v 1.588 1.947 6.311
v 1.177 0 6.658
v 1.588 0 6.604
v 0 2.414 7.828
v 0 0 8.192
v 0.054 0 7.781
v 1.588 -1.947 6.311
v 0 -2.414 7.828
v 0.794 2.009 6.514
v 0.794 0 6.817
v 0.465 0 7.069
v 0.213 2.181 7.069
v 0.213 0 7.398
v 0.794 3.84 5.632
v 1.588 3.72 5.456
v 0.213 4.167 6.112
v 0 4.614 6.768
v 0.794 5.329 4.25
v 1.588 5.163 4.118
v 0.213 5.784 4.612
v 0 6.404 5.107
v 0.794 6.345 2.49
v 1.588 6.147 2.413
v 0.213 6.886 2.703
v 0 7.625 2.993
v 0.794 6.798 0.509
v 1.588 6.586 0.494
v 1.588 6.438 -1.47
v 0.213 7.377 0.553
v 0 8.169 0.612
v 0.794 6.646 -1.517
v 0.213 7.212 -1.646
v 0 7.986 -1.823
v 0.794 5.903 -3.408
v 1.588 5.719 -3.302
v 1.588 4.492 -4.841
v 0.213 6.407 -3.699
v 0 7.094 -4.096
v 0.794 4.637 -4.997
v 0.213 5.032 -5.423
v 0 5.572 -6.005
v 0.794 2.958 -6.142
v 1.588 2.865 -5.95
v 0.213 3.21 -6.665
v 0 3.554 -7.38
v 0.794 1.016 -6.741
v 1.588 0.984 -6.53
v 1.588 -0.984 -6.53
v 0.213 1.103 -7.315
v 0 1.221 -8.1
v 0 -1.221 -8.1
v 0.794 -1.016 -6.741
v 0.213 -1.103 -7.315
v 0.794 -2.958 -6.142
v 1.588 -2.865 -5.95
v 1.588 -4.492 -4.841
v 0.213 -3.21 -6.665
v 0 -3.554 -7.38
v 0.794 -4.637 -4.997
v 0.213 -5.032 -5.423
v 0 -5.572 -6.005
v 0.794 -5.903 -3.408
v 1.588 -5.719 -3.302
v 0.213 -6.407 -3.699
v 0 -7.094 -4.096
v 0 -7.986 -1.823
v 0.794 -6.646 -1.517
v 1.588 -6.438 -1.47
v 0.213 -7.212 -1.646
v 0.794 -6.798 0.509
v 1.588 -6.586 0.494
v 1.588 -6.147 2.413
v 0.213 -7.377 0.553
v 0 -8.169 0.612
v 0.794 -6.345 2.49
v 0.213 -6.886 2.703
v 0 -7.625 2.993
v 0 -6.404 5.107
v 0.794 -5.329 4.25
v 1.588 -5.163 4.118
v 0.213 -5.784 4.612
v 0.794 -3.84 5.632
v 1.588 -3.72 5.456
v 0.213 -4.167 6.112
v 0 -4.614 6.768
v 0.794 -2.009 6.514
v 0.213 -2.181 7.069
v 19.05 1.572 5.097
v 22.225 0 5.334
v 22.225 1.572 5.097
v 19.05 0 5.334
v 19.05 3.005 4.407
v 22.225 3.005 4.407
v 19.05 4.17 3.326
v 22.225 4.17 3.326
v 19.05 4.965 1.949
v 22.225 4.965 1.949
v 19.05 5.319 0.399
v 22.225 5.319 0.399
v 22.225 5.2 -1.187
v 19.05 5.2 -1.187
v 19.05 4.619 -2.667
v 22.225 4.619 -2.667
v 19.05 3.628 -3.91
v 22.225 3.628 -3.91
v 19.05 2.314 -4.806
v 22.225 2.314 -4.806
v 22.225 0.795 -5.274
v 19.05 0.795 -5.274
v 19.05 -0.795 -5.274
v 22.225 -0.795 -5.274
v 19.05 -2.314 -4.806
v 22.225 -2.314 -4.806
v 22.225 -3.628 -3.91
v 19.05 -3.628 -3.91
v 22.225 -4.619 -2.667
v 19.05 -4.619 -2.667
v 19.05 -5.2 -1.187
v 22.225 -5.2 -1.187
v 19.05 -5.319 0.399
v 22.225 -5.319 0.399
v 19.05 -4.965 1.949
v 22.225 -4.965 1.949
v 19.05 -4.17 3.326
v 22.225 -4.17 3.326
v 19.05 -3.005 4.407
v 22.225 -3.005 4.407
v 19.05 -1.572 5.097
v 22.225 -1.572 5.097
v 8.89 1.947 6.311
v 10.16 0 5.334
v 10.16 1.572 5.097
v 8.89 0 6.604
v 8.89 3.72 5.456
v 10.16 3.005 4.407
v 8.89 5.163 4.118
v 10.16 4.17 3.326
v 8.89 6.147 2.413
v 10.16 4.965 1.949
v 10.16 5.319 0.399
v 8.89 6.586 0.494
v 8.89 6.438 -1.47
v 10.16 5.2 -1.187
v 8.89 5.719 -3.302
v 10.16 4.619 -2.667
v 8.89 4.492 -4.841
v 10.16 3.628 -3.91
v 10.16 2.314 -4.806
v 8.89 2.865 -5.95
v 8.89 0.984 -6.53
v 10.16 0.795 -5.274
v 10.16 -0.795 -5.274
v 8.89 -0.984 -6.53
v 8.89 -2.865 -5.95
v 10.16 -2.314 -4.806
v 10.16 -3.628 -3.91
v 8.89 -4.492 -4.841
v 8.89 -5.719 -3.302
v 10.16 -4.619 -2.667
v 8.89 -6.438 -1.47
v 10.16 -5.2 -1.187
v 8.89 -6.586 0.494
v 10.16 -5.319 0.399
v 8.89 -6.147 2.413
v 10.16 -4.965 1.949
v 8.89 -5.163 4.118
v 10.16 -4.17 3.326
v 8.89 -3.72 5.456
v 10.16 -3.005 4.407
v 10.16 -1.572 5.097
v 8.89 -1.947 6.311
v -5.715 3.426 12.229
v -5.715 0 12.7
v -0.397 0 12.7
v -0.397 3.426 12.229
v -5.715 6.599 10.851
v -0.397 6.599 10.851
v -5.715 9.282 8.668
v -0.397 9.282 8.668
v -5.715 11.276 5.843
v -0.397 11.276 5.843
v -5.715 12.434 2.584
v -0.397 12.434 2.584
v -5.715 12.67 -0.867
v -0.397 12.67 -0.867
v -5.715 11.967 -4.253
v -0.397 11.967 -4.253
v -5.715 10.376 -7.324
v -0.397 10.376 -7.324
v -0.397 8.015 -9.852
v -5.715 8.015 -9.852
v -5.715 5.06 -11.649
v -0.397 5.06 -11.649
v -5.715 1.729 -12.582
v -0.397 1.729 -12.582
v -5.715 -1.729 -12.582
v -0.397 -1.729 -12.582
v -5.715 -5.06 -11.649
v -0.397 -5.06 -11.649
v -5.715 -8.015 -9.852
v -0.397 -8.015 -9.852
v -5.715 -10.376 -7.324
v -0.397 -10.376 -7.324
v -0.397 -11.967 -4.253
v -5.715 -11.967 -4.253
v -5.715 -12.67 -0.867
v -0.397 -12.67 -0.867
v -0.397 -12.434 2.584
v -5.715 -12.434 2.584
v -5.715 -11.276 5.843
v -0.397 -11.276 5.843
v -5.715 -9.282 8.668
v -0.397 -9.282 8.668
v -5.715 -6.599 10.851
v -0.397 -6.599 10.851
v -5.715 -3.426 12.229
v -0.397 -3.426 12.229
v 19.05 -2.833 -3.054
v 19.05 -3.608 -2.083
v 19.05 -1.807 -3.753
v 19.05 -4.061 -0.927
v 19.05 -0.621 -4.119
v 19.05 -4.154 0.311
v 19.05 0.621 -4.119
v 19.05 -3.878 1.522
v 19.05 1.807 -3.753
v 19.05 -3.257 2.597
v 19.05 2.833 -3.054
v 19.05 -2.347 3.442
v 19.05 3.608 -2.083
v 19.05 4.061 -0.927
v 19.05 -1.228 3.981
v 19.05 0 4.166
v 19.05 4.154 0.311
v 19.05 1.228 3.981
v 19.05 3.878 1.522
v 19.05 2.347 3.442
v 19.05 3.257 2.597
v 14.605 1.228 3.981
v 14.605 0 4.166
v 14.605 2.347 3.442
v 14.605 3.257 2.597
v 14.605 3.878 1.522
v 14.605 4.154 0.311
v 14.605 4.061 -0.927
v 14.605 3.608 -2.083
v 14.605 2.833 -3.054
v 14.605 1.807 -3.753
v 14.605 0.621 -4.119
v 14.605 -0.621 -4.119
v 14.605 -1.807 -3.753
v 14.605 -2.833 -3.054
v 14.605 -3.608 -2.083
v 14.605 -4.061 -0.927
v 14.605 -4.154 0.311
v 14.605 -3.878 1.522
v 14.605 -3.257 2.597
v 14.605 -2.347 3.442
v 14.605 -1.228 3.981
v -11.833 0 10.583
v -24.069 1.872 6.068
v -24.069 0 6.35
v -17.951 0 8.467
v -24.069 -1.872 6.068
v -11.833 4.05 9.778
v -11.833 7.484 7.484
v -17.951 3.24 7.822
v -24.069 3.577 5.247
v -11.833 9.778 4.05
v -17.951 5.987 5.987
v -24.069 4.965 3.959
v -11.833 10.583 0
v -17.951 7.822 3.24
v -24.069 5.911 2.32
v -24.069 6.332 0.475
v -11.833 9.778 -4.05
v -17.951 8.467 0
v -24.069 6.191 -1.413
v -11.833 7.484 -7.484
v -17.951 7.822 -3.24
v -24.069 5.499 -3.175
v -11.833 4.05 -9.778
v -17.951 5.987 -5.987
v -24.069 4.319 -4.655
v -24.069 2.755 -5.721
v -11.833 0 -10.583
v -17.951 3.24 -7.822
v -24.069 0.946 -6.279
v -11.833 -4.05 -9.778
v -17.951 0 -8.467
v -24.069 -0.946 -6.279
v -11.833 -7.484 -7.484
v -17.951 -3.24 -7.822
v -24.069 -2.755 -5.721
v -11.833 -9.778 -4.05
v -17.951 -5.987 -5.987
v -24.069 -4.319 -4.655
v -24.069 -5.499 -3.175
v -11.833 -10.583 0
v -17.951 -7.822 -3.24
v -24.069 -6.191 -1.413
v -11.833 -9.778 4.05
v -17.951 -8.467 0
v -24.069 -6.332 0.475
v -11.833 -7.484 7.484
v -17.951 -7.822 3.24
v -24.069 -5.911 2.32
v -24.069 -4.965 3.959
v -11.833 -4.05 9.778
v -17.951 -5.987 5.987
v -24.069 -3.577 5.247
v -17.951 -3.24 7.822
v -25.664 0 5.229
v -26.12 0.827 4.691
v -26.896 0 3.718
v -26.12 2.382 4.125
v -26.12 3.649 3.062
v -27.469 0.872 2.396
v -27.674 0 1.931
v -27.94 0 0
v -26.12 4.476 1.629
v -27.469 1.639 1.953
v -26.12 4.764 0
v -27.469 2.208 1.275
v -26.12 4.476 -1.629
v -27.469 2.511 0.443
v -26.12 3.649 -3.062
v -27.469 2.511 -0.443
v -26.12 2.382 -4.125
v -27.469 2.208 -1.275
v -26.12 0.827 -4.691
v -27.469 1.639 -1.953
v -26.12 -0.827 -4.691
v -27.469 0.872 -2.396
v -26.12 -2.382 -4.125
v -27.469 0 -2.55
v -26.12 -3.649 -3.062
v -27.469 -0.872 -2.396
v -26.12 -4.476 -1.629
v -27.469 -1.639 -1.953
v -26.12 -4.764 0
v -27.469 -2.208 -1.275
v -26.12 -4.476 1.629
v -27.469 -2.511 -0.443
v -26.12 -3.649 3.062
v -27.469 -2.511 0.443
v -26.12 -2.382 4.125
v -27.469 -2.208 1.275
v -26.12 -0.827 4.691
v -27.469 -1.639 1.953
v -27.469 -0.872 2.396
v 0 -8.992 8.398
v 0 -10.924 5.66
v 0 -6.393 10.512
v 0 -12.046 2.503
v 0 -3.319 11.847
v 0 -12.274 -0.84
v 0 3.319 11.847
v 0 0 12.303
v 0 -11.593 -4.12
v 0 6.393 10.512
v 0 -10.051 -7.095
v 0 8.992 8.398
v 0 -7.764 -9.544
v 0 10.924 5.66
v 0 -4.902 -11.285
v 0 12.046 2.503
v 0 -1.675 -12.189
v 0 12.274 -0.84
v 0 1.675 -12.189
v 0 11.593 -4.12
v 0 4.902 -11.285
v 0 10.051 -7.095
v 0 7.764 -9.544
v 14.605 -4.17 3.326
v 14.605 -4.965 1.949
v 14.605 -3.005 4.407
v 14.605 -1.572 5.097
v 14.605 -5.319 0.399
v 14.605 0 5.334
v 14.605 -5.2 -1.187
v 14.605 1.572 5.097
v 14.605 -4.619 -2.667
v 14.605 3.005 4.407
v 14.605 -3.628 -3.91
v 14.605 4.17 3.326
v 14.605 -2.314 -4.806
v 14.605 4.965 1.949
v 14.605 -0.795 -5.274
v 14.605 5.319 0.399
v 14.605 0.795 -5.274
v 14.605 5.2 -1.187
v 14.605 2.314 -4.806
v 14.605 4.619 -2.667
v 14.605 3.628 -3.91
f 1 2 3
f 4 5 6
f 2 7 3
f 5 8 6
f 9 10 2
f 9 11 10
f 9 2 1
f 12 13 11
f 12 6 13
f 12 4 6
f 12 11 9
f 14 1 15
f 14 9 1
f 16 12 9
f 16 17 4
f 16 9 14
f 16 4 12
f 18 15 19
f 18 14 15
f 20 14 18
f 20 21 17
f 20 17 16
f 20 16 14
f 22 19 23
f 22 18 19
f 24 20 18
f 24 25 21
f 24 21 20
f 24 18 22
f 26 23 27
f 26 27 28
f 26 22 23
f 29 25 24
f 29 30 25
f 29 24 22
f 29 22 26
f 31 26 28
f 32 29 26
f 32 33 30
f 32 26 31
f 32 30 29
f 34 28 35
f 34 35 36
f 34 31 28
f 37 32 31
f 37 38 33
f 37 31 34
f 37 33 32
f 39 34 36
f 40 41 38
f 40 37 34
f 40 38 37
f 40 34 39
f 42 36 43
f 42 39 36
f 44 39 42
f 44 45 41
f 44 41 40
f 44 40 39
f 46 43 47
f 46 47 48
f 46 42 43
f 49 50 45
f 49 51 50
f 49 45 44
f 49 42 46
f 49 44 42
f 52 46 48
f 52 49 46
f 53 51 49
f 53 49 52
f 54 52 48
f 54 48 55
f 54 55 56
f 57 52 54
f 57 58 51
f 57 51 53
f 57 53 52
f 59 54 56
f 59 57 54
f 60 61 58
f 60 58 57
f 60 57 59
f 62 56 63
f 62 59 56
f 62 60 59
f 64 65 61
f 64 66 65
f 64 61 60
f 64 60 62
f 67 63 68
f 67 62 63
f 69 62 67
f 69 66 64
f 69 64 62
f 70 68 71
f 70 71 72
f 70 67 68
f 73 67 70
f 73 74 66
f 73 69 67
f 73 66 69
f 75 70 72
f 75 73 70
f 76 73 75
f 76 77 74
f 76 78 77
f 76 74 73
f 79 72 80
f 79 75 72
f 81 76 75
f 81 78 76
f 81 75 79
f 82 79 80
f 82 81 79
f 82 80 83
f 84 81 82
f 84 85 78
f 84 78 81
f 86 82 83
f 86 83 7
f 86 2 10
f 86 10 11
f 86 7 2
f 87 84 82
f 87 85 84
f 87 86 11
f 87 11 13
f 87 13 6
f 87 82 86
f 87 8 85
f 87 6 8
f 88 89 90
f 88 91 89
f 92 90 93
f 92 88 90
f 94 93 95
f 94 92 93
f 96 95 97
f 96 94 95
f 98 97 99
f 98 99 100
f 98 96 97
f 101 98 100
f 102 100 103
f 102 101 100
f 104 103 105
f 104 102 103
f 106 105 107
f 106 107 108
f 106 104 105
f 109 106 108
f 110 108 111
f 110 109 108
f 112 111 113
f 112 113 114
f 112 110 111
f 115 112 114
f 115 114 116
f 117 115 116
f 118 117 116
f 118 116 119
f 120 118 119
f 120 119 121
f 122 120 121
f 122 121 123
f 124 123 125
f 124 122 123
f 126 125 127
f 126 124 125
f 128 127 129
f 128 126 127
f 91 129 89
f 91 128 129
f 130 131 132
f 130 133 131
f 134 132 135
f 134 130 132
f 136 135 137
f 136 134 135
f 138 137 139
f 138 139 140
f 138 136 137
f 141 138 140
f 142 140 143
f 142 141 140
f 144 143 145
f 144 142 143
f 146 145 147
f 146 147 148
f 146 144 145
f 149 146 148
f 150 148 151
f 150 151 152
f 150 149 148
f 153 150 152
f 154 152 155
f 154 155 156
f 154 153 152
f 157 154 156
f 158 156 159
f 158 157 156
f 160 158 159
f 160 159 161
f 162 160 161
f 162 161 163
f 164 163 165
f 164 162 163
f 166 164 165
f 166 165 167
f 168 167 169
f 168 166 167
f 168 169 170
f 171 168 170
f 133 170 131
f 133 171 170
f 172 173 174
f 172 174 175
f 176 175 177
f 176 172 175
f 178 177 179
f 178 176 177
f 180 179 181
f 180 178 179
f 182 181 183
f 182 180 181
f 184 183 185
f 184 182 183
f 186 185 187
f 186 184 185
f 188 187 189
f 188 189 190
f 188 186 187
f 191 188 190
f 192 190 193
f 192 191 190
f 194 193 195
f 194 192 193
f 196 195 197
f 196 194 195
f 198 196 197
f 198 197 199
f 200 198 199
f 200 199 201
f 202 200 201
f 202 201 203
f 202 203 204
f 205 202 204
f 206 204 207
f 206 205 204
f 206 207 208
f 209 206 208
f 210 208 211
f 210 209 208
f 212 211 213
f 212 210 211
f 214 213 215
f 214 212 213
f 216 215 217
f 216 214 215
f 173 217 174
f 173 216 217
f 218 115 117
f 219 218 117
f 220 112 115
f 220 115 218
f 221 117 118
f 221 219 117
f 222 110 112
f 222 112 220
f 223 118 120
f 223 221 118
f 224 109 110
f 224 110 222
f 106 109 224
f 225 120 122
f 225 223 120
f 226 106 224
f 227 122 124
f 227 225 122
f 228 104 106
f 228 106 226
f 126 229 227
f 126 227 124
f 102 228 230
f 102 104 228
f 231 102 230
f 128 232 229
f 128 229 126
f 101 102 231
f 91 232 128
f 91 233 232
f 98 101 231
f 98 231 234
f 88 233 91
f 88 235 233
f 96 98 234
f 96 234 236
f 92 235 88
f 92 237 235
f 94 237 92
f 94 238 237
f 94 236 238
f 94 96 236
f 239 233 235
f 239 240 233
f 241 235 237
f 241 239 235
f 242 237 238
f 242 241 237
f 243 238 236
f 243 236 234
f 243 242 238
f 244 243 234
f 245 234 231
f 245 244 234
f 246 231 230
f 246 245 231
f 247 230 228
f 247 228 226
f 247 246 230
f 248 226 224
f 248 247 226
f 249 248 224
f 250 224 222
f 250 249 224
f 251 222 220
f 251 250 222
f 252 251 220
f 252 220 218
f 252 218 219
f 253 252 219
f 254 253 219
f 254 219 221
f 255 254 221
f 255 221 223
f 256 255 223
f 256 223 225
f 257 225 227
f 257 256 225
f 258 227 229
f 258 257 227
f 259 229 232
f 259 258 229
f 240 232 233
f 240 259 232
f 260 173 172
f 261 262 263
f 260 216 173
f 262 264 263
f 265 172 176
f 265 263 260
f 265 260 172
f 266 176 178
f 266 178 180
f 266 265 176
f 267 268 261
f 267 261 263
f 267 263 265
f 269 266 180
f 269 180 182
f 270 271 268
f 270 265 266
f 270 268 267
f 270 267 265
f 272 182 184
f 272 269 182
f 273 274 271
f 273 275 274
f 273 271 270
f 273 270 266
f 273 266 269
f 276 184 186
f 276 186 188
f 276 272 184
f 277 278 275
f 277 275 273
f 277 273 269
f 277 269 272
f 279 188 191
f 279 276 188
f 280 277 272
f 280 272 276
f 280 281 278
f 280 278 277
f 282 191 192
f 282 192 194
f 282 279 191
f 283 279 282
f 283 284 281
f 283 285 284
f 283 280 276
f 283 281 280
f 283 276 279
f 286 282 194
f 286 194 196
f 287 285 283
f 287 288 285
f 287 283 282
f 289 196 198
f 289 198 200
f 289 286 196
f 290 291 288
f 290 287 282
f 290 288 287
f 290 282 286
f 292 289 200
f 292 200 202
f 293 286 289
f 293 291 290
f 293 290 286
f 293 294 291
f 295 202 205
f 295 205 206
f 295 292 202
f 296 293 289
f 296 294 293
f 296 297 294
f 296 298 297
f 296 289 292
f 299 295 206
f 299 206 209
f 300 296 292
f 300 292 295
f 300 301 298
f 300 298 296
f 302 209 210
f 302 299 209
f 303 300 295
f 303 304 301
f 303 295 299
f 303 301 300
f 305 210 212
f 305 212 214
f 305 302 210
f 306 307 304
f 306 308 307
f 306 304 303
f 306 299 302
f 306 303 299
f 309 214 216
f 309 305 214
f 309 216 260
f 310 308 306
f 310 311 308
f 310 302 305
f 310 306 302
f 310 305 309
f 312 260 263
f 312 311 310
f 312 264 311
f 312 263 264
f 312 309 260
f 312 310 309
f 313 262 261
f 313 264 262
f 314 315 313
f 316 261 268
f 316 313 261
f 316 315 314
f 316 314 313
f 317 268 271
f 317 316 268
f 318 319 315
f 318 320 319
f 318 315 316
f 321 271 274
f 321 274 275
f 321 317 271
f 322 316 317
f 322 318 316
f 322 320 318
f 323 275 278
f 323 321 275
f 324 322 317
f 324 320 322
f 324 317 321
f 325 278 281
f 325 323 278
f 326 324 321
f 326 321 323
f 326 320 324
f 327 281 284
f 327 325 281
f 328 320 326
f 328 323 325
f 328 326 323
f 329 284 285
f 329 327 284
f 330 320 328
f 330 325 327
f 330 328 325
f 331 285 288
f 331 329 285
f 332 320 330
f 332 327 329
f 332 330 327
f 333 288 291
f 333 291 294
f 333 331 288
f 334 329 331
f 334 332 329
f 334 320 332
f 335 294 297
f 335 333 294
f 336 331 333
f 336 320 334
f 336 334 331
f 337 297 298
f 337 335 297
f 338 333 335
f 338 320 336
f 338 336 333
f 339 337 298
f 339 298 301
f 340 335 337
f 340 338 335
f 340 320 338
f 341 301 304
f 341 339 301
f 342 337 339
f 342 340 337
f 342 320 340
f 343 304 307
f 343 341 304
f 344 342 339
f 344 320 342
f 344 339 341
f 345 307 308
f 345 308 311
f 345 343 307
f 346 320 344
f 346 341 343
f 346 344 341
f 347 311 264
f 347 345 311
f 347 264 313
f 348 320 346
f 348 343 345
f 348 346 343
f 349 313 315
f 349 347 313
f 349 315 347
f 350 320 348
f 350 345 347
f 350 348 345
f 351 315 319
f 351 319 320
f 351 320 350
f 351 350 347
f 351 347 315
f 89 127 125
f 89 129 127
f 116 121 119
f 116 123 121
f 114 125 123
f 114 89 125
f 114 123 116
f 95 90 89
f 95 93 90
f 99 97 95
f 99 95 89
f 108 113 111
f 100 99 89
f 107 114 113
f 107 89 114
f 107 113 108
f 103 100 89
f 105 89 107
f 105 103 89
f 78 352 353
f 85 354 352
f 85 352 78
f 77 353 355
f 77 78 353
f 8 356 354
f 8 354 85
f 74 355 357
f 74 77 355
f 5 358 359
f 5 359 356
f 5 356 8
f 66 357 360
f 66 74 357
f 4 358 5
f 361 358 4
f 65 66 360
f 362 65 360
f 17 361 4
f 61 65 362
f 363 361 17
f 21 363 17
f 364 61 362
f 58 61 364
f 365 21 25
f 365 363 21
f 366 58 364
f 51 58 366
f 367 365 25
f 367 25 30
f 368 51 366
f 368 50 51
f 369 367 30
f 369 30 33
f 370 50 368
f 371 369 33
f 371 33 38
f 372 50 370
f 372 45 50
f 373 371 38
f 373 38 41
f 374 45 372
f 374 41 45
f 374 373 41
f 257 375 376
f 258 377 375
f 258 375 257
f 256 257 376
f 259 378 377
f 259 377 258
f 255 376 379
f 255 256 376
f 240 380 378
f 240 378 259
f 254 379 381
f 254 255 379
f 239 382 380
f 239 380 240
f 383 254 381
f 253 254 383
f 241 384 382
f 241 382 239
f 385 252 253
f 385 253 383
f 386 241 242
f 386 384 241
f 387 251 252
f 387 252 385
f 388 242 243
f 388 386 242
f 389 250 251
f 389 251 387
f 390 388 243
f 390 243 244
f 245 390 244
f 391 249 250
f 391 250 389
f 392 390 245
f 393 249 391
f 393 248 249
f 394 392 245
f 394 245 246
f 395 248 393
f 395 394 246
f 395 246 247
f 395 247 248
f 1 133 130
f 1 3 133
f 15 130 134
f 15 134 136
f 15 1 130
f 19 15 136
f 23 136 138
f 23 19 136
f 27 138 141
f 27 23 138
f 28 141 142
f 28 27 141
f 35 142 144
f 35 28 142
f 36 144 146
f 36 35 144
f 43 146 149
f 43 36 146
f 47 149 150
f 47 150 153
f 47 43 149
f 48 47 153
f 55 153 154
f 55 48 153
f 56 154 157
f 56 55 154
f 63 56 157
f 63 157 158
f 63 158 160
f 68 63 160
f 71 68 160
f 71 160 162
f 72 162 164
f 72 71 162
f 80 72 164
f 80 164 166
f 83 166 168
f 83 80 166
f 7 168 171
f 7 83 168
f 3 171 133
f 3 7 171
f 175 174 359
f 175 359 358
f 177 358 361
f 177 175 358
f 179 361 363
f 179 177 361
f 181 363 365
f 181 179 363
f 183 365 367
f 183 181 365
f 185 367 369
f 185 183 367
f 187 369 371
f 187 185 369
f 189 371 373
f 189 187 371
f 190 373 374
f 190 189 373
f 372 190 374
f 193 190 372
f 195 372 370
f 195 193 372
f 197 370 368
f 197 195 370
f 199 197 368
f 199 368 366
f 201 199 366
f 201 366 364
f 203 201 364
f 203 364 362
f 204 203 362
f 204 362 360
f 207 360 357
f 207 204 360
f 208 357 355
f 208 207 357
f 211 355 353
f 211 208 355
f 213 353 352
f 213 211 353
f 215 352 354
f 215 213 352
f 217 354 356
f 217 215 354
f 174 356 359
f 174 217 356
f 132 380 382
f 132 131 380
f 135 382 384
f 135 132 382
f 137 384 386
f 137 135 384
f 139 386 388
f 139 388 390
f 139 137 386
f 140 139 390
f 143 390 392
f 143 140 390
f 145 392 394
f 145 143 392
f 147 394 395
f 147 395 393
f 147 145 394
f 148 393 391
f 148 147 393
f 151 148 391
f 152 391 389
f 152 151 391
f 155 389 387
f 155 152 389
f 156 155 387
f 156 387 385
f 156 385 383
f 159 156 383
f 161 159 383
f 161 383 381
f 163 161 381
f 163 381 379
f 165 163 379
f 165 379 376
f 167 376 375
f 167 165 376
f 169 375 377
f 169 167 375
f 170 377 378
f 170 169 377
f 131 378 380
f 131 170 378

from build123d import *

# Parameters (mm, degrees)
F2_SIZE = 0.396875


# Not quite as in the source:
# - a feature names something its author has since deleted; it is built from what else it names


with BuildPart() as f1:
    # F0 (on Front) → F1 (revolve)
    with BuildSketch(Plane.XZ):
        with BuildLine():
            Line((0, 8.1915), (0, 12.7))
            Line((0, 12.7), (-5.715, 12.7))
            Line((-5.715, 12.7), (-24.0689650903, 6.35))
            ThreePointArc((-24.0689650903, 6.35), (-26.8959476355, 3.7184476355), (-27.94, 0))
            Line((-27.94, 0), (22.225, 0))
            Line((22.225, 0), (22.225, 5.334))
            Line((22.225, 5.334), (19.05, 5.334))
            Line((19.05, 5.334), (19.05, 4.1656))
            Line((19.05, 4.1656), (14.605, 4.1656))
            Line((14.605, 4.1656), (14.605, 5.334))
            Line((14.605, 5.334), (10.16, 5.334))
            Line((10.16, 5.334), (8.89, 6.604))
            Line((8.89, 6.604), (1.5875, 6.604))
            ThreePointArc((1.5875, 6.604), (0.4649679849, 7.0689679849), (0, 8.1915))
        make_face()
    revolve(axis=Axis((-2.8575, 0, 0), (-1, 0, 0)))

    # F2
    f2_edges = [f1.edges().sort_by_distance(p)[0] for p in [
        (0, 0, -12.7),
    ]]
    chamfer(f2_edges, length=F2_SIZE)


solid = f1.part
